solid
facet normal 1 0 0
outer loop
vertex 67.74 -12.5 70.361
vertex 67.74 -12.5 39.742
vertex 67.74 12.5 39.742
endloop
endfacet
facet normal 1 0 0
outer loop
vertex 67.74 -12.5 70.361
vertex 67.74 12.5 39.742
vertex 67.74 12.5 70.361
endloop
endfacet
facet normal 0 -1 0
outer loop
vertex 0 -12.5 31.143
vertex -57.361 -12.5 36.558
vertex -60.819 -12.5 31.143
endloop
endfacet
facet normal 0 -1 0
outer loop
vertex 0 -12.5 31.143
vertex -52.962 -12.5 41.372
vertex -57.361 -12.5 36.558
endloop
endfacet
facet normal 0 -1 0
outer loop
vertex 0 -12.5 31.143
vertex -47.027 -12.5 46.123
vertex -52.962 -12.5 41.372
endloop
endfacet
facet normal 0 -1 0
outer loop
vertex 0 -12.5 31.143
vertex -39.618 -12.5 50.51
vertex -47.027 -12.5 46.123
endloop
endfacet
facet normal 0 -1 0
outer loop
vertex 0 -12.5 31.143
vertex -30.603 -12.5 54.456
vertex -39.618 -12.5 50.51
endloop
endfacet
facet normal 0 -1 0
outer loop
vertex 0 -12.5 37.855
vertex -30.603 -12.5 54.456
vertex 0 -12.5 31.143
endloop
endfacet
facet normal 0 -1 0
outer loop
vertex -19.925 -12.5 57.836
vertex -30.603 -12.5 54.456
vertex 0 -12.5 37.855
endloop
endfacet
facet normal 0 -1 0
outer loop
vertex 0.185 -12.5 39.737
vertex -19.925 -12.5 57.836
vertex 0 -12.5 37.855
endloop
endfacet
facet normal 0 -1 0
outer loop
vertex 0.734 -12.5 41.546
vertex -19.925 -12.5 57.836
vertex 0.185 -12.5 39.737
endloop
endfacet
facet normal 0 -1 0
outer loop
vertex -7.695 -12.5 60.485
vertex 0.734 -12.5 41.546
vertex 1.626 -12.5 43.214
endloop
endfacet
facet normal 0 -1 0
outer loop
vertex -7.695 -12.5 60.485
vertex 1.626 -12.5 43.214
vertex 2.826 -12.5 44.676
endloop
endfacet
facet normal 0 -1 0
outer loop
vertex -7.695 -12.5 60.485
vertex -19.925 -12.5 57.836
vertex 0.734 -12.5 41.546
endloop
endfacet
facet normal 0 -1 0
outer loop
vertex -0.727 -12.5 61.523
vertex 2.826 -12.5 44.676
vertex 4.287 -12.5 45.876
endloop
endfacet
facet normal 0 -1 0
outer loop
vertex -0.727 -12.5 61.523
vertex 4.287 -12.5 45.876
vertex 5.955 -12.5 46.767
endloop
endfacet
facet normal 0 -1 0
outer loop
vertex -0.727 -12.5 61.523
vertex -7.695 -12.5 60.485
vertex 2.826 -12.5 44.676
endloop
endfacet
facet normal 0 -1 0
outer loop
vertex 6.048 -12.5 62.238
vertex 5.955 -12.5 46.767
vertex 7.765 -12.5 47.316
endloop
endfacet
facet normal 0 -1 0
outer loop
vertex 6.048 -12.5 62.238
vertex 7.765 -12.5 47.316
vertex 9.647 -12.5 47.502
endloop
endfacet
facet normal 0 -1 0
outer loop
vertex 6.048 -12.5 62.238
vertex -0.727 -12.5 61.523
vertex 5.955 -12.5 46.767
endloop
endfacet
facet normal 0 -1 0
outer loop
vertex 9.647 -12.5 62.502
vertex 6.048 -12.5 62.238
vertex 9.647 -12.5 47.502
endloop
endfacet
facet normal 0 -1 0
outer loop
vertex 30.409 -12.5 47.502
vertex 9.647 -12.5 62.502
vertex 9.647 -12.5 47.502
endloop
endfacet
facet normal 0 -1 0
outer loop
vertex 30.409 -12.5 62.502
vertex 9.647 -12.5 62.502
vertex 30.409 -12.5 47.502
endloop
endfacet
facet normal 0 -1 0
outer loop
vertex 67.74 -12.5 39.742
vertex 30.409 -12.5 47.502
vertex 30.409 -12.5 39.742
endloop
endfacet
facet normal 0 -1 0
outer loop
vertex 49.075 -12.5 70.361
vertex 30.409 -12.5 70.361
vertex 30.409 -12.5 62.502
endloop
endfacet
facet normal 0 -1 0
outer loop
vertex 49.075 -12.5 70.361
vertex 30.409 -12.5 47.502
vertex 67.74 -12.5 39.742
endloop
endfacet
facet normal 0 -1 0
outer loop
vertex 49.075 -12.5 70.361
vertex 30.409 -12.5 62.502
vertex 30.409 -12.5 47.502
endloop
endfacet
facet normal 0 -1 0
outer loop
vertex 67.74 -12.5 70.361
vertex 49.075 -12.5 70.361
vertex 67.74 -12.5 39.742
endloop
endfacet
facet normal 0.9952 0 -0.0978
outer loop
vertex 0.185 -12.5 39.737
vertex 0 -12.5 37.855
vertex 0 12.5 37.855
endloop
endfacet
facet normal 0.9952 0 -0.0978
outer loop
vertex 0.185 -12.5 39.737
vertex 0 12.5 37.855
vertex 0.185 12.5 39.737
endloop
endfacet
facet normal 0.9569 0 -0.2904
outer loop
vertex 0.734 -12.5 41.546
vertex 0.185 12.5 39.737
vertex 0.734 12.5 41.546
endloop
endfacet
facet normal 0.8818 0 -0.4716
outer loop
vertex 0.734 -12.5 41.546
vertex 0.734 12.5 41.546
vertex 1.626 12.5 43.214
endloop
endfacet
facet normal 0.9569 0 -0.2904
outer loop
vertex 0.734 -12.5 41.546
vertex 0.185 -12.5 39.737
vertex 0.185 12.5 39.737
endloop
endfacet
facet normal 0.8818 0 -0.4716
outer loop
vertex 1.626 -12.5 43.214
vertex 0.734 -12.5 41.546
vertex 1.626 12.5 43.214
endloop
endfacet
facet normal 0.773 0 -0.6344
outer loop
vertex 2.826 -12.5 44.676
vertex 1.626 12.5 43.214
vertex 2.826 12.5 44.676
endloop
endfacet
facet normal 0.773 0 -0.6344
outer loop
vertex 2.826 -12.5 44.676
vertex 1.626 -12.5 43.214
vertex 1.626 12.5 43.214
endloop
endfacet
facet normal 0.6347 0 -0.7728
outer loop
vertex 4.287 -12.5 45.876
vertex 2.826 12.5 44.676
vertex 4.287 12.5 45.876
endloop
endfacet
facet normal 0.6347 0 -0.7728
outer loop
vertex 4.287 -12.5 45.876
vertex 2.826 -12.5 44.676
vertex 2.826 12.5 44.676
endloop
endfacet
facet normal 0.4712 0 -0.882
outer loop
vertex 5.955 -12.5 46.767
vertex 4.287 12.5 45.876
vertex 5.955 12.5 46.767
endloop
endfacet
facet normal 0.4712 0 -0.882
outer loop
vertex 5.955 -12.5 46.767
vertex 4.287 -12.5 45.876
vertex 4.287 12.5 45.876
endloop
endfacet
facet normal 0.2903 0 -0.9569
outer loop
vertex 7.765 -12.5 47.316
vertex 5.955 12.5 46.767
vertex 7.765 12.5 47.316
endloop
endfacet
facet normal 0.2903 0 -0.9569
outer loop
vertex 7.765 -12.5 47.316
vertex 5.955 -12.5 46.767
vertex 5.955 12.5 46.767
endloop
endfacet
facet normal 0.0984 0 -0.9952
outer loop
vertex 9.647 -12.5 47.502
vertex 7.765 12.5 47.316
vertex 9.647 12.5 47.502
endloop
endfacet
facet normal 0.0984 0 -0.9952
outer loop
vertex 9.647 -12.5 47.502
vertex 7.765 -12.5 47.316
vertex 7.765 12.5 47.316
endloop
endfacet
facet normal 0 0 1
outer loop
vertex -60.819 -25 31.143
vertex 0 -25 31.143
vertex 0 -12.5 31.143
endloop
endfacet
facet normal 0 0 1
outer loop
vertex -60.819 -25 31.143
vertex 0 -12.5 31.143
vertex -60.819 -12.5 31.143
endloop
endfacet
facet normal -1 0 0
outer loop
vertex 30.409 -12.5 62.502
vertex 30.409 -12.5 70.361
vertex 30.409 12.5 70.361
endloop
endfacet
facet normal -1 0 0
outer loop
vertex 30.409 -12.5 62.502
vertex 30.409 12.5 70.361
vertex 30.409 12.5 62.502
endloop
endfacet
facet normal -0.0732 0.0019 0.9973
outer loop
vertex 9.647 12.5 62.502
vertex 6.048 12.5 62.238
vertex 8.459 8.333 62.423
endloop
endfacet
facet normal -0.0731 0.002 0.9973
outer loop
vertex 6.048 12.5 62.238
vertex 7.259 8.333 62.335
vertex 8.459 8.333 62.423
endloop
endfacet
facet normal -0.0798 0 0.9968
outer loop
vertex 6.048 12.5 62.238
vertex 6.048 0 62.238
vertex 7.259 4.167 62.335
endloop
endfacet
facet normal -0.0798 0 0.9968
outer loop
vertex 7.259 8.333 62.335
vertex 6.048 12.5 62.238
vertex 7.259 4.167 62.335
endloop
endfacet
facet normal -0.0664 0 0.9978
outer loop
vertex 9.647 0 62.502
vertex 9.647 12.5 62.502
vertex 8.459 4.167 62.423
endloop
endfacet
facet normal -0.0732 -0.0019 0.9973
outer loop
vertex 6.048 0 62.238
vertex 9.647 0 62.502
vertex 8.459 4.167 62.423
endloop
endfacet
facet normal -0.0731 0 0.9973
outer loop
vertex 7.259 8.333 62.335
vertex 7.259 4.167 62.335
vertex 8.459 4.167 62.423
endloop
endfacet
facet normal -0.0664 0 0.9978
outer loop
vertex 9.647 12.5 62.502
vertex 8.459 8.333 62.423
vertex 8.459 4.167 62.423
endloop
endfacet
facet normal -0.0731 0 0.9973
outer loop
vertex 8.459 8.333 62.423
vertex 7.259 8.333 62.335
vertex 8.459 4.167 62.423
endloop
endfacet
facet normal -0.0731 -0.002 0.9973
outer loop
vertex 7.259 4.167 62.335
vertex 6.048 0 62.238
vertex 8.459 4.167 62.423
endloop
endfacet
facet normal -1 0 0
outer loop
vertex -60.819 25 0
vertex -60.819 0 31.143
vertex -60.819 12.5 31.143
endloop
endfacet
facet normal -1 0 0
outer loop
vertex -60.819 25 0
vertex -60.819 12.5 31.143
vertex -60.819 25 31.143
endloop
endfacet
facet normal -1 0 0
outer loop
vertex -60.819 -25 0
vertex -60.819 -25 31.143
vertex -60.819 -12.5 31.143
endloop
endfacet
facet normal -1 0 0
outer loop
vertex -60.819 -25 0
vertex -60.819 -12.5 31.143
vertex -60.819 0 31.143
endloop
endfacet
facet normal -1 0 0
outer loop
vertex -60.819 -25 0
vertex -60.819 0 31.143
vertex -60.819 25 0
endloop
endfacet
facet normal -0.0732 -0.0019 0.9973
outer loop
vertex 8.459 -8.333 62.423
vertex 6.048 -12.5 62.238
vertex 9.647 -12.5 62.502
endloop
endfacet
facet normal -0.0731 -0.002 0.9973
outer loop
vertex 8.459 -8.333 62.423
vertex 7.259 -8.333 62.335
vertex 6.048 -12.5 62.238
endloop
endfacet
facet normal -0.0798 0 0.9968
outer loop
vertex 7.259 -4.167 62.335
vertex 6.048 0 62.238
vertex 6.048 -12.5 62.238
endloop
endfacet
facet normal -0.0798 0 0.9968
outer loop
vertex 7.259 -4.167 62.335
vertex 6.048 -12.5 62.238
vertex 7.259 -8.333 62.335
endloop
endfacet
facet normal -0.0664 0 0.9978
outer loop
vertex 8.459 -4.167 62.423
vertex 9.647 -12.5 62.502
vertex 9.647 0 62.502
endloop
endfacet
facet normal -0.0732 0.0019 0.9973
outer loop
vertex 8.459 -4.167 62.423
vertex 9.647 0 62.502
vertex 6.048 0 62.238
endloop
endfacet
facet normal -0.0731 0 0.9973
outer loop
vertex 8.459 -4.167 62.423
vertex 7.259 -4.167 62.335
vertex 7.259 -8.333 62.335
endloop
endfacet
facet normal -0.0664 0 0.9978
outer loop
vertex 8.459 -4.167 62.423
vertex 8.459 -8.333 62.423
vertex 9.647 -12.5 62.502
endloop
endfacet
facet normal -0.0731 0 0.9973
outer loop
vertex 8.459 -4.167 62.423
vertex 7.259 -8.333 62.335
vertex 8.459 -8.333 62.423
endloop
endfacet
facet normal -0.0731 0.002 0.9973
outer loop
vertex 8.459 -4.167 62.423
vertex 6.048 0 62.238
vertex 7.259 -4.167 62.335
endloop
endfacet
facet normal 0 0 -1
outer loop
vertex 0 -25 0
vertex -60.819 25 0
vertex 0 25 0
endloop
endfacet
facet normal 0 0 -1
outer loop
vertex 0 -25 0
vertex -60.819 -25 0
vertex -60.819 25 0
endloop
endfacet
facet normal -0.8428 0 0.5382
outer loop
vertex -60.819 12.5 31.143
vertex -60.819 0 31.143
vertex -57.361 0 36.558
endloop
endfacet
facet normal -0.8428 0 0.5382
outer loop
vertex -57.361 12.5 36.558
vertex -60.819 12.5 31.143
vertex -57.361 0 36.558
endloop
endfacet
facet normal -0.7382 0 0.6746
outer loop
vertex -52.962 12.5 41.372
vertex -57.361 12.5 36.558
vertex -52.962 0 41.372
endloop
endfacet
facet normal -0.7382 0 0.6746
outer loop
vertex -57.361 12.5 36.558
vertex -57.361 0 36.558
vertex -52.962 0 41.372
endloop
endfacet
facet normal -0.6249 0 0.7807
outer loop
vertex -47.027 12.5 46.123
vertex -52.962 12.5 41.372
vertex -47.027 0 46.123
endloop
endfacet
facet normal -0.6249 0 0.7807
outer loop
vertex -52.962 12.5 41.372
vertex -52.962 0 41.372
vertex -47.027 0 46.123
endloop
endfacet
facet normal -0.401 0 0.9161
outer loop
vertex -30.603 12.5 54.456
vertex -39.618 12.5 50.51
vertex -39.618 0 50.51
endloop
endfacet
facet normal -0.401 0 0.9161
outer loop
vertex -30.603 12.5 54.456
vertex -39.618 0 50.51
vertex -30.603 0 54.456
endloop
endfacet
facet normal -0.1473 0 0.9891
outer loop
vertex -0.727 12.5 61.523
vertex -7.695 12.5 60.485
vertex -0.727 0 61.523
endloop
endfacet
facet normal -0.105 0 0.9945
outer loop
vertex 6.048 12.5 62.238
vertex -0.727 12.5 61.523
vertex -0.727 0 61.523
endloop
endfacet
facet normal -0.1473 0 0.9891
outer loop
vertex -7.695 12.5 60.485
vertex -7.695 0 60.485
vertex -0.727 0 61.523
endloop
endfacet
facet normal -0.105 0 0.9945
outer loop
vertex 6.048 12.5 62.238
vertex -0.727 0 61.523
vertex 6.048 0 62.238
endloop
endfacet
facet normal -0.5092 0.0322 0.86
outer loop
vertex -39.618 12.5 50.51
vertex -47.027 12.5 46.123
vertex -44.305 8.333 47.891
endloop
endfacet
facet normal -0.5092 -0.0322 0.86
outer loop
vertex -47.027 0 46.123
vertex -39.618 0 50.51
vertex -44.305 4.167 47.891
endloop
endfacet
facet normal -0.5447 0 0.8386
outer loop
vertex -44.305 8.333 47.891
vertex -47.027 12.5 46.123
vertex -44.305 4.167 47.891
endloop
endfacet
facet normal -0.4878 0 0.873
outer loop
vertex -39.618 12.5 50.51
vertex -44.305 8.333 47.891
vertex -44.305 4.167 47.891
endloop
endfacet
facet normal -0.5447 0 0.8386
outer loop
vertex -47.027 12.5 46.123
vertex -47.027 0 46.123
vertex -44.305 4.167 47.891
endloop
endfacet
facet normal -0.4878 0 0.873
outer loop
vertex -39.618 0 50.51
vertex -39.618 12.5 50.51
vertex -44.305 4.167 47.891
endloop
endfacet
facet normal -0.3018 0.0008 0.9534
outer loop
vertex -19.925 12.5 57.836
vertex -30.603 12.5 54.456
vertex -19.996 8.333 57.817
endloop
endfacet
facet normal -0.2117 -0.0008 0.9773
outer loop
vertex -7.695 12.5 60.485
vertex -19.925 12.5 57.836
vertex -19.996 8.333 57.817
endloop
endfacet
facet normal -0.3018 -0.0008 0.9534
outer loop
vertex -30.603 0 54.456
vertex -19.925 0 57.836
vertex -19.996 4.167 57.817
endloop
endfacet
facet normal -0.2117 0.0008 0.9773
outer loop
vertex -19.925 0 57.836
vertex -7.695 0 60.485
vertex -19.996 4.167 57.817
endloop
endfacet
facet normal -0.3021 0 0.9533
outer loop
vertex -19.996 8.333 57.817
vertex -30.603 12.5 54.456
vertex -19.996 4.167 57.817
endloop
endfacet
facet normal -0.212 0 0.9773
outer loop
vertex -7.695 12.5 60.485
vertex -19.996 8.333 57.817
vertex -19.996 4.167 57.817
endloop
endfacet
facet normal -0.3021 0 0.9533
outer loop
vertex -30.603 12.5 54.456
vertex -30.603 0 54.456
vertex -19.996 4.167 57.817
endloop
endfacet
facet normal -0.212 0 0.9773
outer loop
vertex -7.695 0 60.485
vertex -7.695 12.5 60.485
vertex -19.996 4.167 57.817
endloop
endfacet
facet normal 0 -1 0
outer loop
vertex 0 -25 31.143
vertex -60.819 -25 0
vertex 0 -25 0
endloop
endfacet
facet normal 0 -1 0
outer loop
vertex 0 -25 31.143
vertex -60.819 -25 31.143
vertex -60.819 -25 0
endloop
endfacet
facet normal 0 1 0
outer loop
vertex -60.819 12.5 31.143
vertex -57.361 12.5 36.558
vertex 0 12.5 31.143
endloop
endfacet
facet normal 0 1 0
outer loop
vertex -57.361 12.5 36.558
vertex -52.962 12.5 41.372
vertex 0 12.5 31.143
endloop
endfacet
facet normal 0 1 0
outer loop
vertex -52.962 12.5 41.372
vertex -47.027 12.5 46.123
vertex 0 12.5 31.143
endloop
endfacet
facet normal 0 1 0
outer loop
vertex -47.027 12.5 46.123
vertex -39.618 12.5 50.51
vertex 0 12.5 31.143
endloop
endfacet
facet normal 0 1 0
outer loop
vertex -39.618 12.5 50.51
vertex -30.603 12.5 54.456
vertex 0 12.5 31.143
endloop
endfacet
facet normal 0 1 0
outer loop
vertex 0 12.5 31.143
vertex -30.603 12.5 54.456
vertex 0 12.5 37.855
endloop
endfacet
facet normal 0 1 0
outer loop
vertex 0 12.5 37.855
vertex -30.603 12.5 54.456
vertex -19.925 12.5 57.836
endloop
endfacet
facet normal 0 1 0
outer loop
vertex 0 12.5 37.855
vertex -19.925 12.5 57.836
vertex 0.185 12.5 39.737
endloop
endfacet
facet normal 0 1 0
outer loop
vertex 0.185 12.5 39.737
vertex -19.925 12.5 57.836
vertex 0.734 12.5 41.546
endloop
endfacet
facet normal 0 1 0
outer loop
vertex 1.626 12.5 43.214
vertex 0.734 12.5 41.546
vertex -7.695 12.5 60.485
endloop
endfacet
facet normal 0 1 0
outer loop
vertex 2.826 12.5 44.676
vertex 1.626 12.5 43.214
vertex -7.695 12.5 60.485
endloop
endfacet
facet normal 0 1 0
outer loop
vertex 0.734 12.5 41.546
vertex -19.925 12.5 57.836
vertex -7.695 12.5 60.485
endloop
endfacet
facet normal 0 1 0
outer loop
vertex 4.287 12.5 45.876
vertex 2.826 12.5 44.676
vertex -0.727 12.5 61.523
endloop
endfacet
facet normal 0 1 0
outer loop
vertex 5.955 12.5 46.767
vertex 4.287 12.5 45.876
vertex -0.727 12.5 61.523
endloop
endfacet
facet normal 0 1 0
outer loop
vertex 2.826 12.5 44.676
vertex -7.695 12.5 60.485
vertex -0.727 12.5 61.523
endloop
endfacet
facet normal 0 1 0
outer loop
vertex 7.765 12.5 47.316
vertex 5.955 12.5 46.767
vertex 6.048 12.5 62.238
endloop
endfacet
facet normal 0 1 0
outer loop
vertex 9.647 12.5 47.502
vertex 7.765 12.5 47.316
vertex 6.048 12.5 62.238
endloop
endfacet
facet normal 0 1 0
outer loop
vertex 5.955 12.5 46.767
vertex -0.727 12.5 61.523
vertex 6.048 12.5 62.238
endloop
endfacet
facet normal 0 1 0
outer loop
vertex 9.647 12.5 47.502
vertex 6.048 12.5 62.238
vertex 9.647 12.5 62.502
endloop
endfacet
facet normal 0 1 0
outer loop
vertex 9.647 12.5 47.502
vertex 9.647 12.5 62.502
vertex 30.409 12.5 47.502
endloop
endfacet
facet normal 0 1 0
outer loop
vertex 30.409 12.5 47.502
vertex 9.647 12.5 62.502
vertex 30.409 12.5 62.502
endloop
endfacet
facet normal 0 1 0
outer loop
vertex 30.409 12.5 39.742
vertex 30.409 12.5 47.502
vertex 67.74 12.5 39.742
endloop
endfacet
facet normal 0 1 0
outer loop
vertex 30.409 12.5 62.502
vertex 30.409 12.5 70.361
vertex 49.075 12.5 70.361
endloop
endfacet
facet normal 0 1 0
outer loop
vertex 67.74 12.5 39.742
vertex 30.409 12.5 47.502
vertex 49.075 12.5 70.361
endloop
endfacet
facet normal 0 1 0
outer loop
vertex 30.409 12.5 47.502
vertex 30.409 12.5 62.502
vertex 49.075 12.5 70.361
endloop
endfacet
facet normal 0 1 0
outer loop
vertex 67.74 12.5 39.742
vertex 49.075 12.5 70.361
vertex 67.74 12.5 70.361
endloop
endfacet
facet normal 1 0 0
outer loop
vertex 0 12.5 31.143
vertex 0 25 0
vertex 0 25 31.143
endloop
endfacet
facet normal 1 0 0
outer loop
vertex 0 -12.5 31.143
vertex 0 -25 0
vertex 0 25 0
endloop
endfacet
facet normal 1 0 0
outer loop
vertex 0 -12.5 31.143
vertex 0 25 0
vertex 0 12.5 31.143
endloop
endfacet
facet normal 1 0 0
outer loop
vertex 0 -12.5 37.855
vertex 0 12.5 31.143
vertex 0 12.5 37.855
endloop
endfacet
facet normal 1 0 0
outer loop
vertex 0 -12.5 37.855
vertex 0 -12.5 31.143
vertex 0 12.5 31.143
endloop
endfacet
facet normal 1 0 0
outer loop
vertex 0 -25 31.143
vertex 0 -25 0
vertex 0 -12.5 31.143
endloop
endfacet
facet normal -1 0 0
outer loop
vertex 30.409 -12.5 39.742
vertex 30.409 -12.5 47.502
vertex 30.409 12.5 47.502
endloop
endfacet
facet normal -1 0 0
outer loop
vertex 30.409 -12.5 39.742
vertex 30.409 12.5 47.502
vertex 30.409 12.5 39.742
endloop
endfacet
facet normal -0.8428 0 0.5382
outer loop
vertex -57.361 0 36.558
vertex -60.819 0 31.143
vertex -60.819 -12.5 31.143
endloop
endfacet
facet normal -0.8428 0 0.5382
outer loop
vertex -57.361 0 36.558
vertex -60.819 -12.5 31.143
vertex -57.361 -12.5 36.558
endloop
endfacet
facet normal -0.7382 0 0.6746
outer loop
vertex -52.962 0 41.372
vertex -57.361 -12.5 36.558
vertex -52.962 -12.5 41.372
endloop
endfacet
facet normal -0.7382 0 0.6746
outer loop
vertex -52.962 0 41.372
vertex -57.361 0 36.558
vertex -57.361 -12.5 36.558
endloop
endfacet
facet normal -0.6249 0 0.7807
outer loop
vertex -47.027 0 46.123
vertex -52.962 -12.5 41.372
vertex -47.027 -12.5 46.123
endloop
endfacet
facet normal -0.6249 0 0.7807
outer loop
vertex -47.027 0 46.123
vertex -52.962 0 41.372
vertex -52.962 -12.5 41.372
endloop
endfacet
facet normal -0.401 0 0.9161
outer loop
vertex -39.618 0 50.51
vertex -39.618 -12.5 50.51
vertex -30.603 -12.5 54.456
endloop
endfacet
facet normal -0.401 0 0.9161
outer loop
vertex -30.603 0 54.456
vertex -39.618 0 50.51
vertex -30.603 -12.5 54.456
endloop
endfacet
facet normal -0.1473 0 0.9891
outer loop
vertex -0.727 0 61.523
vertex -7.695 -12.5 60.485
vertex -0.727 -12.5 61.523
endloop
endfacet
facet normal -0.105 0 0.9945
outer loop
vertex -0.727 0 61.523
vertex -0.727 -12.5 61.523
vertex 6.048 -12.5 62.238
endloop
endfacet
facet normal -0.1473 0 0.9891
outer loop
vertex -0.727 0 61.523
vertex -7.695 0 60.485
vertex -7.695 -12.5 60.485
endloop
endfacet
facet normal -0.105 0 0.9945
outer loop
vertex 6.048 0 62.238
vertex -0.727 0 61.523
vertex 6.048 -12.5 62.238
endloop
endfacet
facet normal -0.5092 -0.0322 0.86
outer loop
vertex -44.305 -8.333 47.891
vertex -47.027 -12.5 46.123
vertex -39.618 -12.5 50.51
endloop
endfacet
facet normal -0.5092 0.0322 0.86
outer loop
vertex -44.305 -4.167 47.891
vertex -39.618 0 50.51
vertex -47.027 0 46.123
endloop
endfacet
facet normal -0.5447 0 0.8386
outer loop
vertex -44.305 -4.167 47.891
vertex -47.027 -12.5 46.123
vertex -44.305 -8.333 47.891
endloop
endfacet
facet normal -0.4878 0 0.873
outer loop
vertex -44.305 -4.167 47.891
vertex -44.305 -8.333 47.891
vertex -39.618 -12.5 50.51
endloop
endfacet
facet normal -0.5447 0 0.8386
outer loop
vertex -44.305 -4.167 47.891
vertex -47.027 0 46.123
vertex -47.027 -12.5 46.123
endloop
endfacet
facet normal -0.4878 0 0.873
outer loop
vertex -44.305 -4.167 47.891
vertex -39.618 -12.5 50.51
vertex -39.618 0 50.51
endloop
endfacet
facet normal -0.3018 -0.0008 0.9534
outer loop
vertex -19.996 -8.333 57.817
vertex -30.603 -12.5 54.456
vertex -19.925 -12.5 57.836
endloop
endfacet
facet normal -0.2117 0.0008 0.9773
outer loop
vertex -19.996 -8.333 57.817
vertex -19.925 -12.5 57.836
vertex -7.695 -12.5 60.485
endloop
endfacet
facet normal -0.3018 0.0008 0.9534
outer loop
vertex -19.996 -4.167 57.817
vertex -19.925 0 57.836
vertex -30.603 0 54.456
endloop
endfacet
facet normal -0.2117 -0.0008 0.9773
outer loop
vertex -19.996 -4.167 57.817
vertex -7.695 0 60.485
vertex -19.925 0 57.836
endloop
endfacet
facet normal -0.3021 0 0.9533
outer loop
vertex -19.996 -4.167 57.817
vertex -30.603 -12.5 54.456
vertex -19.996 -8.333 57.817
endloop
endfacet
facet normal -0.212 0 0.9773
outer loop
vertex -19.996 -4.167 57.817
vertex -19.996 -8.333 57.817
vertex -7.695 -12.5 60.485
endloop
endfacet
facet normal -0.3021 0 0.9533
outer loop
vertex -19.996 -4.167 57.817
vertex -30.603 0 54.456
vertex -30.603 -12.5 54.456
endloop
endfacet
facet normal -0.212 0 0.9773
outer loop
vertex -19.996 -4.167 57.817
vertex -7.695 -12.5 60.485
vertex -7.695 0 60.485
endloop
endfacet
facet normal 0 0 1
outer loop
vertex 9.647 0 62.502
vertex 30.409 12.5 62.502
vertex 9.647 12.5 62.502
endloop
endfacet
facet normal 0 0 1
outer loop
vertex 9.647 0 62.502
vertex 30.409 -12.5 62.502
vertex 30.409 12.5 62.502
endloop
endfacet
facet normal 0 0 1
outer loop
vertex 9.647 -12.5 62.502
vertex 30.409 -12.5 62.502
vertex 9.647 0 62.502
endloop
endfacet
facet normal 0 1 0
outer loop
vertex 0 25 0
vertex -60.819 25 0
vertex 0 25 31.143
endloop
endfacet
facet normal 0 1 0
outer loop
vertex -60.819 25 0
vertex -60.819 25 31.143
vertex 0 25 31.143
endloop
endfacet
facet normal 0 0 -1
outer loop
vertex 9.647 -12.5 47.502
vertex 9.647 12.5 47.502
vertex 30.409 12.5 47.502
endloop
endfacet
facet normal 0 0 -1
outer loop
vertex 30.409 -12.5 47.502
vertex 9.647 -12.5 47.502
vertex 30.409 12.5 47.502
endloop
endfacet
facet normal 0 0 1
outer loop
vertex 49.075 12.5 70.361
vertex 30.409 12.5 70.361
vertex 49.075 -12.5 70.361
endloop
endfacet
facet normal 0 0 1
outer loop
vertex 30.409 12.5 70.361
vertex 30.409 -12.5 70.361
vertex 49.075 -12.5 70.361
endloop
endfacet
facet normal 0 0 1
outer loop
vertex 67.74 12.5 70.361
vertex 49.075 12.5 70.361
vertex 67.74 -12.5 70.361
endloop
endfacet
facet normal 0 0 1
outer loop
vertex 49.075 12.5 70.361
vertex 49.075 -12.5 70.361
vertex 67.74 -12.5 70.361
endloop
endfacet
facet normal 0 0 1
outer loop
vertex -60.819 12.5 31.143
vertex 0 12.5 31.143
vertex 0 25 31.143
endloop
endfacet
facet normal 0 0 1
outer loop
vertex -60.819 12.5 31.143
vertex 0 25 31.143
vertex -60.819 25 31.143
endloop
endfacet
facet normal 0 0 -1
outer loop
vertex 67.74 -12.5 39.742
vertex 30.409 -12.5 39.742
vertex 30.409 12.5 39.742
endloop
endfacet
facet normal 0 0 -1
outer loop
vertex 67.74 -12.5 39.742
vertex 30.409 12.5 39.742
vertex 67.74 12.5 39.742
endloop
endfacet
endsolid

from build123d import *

# Parameters (mm, degrees)
F1_DEPTH = 12.5
F2_DEPTH = 25
F0_W     = 18.6651162803
F0_H     = 7.8595249355
F0_H_2   = 15
F0_H_3   = 7.7596530318
F3_DEPTH = 12.5


with BuildPart() as f1:
    # F0 (on Front) → F1 (new body, symmetric)
    with BuildSketch(Plane.XZ):
        with BuildLine():
            add(Edge.make_bspline(
                [(-60.8189068735, 31.1434771866), (-50.2214631846, 51.7385184087), (-18.8444322176, 60.1326987931), (6.0483806323, 62.2375197437)],
                knots=[0, 0, 0, 0, 73.5359127192, 73.5359127192, 73.5359127192, 73.5359127192], degree=3))
            Line((-60.8189068735, 31.1434771866), (-15, 31.1434771866))
            Line((-15, 31.1434771866), (-15, 37.8545261919))
            ThreePointArc((-15, 37.8545261919), (-9.0100386658, 53.9601517758), (6.0483806323, 62.2375197437))
        make_face()
        with BuildLine():
            Line((-15, 31.1434771866), (0, 31.1434771866))
            Line((0, 31.1434771866), (0, 37.8545261919))
            ThreePointArc((0, 37.8545261919), (2.8255814232, 44.6760831855), (9.6471384168, 47.5016646087))
            Line((9.6471384168, 47.5016646087), (30.4094552994, 47.5016646087))
            Line((30.4094552994, 47.5016646087), (30.4094552994, 62.5016646087))
            Line((30.4094552994, 62.5016646087), (9.6471384168, 62.5016646087))
            add(Edge.make_bspline(
                [(6.0483806323, 62.2375197437), (7.2645024211, 62.3403493691), (8.4651480287, 62.4281678914), (9.6471384168, 62.5016646087)],
                knots=[73.5359127192, 73.5359127192, 73.5359127192, 73.5359127192, 77.1284607473, 77.1284607473, 77.1284607473, 77.1284607473], degree=3))
            ThreePointArc((6.0483806323, 62.2375197437), (-9.0100386658, 53.9601517758), (-15, 37.8545261919))
            Line((-15, 37.8545261919), (-15, 31.1434771866))
        make_face()
    extrude(amount=F1_DEPTH, both=True)

    # F0 (on Front) → F2 (join, symmetric)
    with BuildSketch(Plane.XZ):
        Polygon((-60.8189068735, 0), (0, 0), (0, 31.1434771866), (-15, 31.1434771866), (-60.8189068735, 31.1434771866), align=None)
    extrude(amount=F2_DEPTH, both=True)

    # F0 (on Front) → F3 (join, symmetric)
    with BuildSketch(Plane.XZ):
        with Locations((39.7420134395, 66.4314270765)):
            Rectangle(F0_W, F0_H)
        with Locations((39.7420134395, 55.0016646087)):
            Rectangle(F0_W, F0_H_2)
        with Locations((39.7420134395, 43.6218380928)):
            Rectangle(F0_W, F0_H_3)
        Polygon((49.0745715797, 62.5016646087), (49.0745715797, 47.5016646087), (49.0745715797, 39.7420115769), (67.73968786, 39.7420115769), (67.73968786, 70.3611895442), (49.0745715797, 70.3611895442), align=None)
    extrude(amount=F3_DEPTH, both=True)


solid = f1.part
